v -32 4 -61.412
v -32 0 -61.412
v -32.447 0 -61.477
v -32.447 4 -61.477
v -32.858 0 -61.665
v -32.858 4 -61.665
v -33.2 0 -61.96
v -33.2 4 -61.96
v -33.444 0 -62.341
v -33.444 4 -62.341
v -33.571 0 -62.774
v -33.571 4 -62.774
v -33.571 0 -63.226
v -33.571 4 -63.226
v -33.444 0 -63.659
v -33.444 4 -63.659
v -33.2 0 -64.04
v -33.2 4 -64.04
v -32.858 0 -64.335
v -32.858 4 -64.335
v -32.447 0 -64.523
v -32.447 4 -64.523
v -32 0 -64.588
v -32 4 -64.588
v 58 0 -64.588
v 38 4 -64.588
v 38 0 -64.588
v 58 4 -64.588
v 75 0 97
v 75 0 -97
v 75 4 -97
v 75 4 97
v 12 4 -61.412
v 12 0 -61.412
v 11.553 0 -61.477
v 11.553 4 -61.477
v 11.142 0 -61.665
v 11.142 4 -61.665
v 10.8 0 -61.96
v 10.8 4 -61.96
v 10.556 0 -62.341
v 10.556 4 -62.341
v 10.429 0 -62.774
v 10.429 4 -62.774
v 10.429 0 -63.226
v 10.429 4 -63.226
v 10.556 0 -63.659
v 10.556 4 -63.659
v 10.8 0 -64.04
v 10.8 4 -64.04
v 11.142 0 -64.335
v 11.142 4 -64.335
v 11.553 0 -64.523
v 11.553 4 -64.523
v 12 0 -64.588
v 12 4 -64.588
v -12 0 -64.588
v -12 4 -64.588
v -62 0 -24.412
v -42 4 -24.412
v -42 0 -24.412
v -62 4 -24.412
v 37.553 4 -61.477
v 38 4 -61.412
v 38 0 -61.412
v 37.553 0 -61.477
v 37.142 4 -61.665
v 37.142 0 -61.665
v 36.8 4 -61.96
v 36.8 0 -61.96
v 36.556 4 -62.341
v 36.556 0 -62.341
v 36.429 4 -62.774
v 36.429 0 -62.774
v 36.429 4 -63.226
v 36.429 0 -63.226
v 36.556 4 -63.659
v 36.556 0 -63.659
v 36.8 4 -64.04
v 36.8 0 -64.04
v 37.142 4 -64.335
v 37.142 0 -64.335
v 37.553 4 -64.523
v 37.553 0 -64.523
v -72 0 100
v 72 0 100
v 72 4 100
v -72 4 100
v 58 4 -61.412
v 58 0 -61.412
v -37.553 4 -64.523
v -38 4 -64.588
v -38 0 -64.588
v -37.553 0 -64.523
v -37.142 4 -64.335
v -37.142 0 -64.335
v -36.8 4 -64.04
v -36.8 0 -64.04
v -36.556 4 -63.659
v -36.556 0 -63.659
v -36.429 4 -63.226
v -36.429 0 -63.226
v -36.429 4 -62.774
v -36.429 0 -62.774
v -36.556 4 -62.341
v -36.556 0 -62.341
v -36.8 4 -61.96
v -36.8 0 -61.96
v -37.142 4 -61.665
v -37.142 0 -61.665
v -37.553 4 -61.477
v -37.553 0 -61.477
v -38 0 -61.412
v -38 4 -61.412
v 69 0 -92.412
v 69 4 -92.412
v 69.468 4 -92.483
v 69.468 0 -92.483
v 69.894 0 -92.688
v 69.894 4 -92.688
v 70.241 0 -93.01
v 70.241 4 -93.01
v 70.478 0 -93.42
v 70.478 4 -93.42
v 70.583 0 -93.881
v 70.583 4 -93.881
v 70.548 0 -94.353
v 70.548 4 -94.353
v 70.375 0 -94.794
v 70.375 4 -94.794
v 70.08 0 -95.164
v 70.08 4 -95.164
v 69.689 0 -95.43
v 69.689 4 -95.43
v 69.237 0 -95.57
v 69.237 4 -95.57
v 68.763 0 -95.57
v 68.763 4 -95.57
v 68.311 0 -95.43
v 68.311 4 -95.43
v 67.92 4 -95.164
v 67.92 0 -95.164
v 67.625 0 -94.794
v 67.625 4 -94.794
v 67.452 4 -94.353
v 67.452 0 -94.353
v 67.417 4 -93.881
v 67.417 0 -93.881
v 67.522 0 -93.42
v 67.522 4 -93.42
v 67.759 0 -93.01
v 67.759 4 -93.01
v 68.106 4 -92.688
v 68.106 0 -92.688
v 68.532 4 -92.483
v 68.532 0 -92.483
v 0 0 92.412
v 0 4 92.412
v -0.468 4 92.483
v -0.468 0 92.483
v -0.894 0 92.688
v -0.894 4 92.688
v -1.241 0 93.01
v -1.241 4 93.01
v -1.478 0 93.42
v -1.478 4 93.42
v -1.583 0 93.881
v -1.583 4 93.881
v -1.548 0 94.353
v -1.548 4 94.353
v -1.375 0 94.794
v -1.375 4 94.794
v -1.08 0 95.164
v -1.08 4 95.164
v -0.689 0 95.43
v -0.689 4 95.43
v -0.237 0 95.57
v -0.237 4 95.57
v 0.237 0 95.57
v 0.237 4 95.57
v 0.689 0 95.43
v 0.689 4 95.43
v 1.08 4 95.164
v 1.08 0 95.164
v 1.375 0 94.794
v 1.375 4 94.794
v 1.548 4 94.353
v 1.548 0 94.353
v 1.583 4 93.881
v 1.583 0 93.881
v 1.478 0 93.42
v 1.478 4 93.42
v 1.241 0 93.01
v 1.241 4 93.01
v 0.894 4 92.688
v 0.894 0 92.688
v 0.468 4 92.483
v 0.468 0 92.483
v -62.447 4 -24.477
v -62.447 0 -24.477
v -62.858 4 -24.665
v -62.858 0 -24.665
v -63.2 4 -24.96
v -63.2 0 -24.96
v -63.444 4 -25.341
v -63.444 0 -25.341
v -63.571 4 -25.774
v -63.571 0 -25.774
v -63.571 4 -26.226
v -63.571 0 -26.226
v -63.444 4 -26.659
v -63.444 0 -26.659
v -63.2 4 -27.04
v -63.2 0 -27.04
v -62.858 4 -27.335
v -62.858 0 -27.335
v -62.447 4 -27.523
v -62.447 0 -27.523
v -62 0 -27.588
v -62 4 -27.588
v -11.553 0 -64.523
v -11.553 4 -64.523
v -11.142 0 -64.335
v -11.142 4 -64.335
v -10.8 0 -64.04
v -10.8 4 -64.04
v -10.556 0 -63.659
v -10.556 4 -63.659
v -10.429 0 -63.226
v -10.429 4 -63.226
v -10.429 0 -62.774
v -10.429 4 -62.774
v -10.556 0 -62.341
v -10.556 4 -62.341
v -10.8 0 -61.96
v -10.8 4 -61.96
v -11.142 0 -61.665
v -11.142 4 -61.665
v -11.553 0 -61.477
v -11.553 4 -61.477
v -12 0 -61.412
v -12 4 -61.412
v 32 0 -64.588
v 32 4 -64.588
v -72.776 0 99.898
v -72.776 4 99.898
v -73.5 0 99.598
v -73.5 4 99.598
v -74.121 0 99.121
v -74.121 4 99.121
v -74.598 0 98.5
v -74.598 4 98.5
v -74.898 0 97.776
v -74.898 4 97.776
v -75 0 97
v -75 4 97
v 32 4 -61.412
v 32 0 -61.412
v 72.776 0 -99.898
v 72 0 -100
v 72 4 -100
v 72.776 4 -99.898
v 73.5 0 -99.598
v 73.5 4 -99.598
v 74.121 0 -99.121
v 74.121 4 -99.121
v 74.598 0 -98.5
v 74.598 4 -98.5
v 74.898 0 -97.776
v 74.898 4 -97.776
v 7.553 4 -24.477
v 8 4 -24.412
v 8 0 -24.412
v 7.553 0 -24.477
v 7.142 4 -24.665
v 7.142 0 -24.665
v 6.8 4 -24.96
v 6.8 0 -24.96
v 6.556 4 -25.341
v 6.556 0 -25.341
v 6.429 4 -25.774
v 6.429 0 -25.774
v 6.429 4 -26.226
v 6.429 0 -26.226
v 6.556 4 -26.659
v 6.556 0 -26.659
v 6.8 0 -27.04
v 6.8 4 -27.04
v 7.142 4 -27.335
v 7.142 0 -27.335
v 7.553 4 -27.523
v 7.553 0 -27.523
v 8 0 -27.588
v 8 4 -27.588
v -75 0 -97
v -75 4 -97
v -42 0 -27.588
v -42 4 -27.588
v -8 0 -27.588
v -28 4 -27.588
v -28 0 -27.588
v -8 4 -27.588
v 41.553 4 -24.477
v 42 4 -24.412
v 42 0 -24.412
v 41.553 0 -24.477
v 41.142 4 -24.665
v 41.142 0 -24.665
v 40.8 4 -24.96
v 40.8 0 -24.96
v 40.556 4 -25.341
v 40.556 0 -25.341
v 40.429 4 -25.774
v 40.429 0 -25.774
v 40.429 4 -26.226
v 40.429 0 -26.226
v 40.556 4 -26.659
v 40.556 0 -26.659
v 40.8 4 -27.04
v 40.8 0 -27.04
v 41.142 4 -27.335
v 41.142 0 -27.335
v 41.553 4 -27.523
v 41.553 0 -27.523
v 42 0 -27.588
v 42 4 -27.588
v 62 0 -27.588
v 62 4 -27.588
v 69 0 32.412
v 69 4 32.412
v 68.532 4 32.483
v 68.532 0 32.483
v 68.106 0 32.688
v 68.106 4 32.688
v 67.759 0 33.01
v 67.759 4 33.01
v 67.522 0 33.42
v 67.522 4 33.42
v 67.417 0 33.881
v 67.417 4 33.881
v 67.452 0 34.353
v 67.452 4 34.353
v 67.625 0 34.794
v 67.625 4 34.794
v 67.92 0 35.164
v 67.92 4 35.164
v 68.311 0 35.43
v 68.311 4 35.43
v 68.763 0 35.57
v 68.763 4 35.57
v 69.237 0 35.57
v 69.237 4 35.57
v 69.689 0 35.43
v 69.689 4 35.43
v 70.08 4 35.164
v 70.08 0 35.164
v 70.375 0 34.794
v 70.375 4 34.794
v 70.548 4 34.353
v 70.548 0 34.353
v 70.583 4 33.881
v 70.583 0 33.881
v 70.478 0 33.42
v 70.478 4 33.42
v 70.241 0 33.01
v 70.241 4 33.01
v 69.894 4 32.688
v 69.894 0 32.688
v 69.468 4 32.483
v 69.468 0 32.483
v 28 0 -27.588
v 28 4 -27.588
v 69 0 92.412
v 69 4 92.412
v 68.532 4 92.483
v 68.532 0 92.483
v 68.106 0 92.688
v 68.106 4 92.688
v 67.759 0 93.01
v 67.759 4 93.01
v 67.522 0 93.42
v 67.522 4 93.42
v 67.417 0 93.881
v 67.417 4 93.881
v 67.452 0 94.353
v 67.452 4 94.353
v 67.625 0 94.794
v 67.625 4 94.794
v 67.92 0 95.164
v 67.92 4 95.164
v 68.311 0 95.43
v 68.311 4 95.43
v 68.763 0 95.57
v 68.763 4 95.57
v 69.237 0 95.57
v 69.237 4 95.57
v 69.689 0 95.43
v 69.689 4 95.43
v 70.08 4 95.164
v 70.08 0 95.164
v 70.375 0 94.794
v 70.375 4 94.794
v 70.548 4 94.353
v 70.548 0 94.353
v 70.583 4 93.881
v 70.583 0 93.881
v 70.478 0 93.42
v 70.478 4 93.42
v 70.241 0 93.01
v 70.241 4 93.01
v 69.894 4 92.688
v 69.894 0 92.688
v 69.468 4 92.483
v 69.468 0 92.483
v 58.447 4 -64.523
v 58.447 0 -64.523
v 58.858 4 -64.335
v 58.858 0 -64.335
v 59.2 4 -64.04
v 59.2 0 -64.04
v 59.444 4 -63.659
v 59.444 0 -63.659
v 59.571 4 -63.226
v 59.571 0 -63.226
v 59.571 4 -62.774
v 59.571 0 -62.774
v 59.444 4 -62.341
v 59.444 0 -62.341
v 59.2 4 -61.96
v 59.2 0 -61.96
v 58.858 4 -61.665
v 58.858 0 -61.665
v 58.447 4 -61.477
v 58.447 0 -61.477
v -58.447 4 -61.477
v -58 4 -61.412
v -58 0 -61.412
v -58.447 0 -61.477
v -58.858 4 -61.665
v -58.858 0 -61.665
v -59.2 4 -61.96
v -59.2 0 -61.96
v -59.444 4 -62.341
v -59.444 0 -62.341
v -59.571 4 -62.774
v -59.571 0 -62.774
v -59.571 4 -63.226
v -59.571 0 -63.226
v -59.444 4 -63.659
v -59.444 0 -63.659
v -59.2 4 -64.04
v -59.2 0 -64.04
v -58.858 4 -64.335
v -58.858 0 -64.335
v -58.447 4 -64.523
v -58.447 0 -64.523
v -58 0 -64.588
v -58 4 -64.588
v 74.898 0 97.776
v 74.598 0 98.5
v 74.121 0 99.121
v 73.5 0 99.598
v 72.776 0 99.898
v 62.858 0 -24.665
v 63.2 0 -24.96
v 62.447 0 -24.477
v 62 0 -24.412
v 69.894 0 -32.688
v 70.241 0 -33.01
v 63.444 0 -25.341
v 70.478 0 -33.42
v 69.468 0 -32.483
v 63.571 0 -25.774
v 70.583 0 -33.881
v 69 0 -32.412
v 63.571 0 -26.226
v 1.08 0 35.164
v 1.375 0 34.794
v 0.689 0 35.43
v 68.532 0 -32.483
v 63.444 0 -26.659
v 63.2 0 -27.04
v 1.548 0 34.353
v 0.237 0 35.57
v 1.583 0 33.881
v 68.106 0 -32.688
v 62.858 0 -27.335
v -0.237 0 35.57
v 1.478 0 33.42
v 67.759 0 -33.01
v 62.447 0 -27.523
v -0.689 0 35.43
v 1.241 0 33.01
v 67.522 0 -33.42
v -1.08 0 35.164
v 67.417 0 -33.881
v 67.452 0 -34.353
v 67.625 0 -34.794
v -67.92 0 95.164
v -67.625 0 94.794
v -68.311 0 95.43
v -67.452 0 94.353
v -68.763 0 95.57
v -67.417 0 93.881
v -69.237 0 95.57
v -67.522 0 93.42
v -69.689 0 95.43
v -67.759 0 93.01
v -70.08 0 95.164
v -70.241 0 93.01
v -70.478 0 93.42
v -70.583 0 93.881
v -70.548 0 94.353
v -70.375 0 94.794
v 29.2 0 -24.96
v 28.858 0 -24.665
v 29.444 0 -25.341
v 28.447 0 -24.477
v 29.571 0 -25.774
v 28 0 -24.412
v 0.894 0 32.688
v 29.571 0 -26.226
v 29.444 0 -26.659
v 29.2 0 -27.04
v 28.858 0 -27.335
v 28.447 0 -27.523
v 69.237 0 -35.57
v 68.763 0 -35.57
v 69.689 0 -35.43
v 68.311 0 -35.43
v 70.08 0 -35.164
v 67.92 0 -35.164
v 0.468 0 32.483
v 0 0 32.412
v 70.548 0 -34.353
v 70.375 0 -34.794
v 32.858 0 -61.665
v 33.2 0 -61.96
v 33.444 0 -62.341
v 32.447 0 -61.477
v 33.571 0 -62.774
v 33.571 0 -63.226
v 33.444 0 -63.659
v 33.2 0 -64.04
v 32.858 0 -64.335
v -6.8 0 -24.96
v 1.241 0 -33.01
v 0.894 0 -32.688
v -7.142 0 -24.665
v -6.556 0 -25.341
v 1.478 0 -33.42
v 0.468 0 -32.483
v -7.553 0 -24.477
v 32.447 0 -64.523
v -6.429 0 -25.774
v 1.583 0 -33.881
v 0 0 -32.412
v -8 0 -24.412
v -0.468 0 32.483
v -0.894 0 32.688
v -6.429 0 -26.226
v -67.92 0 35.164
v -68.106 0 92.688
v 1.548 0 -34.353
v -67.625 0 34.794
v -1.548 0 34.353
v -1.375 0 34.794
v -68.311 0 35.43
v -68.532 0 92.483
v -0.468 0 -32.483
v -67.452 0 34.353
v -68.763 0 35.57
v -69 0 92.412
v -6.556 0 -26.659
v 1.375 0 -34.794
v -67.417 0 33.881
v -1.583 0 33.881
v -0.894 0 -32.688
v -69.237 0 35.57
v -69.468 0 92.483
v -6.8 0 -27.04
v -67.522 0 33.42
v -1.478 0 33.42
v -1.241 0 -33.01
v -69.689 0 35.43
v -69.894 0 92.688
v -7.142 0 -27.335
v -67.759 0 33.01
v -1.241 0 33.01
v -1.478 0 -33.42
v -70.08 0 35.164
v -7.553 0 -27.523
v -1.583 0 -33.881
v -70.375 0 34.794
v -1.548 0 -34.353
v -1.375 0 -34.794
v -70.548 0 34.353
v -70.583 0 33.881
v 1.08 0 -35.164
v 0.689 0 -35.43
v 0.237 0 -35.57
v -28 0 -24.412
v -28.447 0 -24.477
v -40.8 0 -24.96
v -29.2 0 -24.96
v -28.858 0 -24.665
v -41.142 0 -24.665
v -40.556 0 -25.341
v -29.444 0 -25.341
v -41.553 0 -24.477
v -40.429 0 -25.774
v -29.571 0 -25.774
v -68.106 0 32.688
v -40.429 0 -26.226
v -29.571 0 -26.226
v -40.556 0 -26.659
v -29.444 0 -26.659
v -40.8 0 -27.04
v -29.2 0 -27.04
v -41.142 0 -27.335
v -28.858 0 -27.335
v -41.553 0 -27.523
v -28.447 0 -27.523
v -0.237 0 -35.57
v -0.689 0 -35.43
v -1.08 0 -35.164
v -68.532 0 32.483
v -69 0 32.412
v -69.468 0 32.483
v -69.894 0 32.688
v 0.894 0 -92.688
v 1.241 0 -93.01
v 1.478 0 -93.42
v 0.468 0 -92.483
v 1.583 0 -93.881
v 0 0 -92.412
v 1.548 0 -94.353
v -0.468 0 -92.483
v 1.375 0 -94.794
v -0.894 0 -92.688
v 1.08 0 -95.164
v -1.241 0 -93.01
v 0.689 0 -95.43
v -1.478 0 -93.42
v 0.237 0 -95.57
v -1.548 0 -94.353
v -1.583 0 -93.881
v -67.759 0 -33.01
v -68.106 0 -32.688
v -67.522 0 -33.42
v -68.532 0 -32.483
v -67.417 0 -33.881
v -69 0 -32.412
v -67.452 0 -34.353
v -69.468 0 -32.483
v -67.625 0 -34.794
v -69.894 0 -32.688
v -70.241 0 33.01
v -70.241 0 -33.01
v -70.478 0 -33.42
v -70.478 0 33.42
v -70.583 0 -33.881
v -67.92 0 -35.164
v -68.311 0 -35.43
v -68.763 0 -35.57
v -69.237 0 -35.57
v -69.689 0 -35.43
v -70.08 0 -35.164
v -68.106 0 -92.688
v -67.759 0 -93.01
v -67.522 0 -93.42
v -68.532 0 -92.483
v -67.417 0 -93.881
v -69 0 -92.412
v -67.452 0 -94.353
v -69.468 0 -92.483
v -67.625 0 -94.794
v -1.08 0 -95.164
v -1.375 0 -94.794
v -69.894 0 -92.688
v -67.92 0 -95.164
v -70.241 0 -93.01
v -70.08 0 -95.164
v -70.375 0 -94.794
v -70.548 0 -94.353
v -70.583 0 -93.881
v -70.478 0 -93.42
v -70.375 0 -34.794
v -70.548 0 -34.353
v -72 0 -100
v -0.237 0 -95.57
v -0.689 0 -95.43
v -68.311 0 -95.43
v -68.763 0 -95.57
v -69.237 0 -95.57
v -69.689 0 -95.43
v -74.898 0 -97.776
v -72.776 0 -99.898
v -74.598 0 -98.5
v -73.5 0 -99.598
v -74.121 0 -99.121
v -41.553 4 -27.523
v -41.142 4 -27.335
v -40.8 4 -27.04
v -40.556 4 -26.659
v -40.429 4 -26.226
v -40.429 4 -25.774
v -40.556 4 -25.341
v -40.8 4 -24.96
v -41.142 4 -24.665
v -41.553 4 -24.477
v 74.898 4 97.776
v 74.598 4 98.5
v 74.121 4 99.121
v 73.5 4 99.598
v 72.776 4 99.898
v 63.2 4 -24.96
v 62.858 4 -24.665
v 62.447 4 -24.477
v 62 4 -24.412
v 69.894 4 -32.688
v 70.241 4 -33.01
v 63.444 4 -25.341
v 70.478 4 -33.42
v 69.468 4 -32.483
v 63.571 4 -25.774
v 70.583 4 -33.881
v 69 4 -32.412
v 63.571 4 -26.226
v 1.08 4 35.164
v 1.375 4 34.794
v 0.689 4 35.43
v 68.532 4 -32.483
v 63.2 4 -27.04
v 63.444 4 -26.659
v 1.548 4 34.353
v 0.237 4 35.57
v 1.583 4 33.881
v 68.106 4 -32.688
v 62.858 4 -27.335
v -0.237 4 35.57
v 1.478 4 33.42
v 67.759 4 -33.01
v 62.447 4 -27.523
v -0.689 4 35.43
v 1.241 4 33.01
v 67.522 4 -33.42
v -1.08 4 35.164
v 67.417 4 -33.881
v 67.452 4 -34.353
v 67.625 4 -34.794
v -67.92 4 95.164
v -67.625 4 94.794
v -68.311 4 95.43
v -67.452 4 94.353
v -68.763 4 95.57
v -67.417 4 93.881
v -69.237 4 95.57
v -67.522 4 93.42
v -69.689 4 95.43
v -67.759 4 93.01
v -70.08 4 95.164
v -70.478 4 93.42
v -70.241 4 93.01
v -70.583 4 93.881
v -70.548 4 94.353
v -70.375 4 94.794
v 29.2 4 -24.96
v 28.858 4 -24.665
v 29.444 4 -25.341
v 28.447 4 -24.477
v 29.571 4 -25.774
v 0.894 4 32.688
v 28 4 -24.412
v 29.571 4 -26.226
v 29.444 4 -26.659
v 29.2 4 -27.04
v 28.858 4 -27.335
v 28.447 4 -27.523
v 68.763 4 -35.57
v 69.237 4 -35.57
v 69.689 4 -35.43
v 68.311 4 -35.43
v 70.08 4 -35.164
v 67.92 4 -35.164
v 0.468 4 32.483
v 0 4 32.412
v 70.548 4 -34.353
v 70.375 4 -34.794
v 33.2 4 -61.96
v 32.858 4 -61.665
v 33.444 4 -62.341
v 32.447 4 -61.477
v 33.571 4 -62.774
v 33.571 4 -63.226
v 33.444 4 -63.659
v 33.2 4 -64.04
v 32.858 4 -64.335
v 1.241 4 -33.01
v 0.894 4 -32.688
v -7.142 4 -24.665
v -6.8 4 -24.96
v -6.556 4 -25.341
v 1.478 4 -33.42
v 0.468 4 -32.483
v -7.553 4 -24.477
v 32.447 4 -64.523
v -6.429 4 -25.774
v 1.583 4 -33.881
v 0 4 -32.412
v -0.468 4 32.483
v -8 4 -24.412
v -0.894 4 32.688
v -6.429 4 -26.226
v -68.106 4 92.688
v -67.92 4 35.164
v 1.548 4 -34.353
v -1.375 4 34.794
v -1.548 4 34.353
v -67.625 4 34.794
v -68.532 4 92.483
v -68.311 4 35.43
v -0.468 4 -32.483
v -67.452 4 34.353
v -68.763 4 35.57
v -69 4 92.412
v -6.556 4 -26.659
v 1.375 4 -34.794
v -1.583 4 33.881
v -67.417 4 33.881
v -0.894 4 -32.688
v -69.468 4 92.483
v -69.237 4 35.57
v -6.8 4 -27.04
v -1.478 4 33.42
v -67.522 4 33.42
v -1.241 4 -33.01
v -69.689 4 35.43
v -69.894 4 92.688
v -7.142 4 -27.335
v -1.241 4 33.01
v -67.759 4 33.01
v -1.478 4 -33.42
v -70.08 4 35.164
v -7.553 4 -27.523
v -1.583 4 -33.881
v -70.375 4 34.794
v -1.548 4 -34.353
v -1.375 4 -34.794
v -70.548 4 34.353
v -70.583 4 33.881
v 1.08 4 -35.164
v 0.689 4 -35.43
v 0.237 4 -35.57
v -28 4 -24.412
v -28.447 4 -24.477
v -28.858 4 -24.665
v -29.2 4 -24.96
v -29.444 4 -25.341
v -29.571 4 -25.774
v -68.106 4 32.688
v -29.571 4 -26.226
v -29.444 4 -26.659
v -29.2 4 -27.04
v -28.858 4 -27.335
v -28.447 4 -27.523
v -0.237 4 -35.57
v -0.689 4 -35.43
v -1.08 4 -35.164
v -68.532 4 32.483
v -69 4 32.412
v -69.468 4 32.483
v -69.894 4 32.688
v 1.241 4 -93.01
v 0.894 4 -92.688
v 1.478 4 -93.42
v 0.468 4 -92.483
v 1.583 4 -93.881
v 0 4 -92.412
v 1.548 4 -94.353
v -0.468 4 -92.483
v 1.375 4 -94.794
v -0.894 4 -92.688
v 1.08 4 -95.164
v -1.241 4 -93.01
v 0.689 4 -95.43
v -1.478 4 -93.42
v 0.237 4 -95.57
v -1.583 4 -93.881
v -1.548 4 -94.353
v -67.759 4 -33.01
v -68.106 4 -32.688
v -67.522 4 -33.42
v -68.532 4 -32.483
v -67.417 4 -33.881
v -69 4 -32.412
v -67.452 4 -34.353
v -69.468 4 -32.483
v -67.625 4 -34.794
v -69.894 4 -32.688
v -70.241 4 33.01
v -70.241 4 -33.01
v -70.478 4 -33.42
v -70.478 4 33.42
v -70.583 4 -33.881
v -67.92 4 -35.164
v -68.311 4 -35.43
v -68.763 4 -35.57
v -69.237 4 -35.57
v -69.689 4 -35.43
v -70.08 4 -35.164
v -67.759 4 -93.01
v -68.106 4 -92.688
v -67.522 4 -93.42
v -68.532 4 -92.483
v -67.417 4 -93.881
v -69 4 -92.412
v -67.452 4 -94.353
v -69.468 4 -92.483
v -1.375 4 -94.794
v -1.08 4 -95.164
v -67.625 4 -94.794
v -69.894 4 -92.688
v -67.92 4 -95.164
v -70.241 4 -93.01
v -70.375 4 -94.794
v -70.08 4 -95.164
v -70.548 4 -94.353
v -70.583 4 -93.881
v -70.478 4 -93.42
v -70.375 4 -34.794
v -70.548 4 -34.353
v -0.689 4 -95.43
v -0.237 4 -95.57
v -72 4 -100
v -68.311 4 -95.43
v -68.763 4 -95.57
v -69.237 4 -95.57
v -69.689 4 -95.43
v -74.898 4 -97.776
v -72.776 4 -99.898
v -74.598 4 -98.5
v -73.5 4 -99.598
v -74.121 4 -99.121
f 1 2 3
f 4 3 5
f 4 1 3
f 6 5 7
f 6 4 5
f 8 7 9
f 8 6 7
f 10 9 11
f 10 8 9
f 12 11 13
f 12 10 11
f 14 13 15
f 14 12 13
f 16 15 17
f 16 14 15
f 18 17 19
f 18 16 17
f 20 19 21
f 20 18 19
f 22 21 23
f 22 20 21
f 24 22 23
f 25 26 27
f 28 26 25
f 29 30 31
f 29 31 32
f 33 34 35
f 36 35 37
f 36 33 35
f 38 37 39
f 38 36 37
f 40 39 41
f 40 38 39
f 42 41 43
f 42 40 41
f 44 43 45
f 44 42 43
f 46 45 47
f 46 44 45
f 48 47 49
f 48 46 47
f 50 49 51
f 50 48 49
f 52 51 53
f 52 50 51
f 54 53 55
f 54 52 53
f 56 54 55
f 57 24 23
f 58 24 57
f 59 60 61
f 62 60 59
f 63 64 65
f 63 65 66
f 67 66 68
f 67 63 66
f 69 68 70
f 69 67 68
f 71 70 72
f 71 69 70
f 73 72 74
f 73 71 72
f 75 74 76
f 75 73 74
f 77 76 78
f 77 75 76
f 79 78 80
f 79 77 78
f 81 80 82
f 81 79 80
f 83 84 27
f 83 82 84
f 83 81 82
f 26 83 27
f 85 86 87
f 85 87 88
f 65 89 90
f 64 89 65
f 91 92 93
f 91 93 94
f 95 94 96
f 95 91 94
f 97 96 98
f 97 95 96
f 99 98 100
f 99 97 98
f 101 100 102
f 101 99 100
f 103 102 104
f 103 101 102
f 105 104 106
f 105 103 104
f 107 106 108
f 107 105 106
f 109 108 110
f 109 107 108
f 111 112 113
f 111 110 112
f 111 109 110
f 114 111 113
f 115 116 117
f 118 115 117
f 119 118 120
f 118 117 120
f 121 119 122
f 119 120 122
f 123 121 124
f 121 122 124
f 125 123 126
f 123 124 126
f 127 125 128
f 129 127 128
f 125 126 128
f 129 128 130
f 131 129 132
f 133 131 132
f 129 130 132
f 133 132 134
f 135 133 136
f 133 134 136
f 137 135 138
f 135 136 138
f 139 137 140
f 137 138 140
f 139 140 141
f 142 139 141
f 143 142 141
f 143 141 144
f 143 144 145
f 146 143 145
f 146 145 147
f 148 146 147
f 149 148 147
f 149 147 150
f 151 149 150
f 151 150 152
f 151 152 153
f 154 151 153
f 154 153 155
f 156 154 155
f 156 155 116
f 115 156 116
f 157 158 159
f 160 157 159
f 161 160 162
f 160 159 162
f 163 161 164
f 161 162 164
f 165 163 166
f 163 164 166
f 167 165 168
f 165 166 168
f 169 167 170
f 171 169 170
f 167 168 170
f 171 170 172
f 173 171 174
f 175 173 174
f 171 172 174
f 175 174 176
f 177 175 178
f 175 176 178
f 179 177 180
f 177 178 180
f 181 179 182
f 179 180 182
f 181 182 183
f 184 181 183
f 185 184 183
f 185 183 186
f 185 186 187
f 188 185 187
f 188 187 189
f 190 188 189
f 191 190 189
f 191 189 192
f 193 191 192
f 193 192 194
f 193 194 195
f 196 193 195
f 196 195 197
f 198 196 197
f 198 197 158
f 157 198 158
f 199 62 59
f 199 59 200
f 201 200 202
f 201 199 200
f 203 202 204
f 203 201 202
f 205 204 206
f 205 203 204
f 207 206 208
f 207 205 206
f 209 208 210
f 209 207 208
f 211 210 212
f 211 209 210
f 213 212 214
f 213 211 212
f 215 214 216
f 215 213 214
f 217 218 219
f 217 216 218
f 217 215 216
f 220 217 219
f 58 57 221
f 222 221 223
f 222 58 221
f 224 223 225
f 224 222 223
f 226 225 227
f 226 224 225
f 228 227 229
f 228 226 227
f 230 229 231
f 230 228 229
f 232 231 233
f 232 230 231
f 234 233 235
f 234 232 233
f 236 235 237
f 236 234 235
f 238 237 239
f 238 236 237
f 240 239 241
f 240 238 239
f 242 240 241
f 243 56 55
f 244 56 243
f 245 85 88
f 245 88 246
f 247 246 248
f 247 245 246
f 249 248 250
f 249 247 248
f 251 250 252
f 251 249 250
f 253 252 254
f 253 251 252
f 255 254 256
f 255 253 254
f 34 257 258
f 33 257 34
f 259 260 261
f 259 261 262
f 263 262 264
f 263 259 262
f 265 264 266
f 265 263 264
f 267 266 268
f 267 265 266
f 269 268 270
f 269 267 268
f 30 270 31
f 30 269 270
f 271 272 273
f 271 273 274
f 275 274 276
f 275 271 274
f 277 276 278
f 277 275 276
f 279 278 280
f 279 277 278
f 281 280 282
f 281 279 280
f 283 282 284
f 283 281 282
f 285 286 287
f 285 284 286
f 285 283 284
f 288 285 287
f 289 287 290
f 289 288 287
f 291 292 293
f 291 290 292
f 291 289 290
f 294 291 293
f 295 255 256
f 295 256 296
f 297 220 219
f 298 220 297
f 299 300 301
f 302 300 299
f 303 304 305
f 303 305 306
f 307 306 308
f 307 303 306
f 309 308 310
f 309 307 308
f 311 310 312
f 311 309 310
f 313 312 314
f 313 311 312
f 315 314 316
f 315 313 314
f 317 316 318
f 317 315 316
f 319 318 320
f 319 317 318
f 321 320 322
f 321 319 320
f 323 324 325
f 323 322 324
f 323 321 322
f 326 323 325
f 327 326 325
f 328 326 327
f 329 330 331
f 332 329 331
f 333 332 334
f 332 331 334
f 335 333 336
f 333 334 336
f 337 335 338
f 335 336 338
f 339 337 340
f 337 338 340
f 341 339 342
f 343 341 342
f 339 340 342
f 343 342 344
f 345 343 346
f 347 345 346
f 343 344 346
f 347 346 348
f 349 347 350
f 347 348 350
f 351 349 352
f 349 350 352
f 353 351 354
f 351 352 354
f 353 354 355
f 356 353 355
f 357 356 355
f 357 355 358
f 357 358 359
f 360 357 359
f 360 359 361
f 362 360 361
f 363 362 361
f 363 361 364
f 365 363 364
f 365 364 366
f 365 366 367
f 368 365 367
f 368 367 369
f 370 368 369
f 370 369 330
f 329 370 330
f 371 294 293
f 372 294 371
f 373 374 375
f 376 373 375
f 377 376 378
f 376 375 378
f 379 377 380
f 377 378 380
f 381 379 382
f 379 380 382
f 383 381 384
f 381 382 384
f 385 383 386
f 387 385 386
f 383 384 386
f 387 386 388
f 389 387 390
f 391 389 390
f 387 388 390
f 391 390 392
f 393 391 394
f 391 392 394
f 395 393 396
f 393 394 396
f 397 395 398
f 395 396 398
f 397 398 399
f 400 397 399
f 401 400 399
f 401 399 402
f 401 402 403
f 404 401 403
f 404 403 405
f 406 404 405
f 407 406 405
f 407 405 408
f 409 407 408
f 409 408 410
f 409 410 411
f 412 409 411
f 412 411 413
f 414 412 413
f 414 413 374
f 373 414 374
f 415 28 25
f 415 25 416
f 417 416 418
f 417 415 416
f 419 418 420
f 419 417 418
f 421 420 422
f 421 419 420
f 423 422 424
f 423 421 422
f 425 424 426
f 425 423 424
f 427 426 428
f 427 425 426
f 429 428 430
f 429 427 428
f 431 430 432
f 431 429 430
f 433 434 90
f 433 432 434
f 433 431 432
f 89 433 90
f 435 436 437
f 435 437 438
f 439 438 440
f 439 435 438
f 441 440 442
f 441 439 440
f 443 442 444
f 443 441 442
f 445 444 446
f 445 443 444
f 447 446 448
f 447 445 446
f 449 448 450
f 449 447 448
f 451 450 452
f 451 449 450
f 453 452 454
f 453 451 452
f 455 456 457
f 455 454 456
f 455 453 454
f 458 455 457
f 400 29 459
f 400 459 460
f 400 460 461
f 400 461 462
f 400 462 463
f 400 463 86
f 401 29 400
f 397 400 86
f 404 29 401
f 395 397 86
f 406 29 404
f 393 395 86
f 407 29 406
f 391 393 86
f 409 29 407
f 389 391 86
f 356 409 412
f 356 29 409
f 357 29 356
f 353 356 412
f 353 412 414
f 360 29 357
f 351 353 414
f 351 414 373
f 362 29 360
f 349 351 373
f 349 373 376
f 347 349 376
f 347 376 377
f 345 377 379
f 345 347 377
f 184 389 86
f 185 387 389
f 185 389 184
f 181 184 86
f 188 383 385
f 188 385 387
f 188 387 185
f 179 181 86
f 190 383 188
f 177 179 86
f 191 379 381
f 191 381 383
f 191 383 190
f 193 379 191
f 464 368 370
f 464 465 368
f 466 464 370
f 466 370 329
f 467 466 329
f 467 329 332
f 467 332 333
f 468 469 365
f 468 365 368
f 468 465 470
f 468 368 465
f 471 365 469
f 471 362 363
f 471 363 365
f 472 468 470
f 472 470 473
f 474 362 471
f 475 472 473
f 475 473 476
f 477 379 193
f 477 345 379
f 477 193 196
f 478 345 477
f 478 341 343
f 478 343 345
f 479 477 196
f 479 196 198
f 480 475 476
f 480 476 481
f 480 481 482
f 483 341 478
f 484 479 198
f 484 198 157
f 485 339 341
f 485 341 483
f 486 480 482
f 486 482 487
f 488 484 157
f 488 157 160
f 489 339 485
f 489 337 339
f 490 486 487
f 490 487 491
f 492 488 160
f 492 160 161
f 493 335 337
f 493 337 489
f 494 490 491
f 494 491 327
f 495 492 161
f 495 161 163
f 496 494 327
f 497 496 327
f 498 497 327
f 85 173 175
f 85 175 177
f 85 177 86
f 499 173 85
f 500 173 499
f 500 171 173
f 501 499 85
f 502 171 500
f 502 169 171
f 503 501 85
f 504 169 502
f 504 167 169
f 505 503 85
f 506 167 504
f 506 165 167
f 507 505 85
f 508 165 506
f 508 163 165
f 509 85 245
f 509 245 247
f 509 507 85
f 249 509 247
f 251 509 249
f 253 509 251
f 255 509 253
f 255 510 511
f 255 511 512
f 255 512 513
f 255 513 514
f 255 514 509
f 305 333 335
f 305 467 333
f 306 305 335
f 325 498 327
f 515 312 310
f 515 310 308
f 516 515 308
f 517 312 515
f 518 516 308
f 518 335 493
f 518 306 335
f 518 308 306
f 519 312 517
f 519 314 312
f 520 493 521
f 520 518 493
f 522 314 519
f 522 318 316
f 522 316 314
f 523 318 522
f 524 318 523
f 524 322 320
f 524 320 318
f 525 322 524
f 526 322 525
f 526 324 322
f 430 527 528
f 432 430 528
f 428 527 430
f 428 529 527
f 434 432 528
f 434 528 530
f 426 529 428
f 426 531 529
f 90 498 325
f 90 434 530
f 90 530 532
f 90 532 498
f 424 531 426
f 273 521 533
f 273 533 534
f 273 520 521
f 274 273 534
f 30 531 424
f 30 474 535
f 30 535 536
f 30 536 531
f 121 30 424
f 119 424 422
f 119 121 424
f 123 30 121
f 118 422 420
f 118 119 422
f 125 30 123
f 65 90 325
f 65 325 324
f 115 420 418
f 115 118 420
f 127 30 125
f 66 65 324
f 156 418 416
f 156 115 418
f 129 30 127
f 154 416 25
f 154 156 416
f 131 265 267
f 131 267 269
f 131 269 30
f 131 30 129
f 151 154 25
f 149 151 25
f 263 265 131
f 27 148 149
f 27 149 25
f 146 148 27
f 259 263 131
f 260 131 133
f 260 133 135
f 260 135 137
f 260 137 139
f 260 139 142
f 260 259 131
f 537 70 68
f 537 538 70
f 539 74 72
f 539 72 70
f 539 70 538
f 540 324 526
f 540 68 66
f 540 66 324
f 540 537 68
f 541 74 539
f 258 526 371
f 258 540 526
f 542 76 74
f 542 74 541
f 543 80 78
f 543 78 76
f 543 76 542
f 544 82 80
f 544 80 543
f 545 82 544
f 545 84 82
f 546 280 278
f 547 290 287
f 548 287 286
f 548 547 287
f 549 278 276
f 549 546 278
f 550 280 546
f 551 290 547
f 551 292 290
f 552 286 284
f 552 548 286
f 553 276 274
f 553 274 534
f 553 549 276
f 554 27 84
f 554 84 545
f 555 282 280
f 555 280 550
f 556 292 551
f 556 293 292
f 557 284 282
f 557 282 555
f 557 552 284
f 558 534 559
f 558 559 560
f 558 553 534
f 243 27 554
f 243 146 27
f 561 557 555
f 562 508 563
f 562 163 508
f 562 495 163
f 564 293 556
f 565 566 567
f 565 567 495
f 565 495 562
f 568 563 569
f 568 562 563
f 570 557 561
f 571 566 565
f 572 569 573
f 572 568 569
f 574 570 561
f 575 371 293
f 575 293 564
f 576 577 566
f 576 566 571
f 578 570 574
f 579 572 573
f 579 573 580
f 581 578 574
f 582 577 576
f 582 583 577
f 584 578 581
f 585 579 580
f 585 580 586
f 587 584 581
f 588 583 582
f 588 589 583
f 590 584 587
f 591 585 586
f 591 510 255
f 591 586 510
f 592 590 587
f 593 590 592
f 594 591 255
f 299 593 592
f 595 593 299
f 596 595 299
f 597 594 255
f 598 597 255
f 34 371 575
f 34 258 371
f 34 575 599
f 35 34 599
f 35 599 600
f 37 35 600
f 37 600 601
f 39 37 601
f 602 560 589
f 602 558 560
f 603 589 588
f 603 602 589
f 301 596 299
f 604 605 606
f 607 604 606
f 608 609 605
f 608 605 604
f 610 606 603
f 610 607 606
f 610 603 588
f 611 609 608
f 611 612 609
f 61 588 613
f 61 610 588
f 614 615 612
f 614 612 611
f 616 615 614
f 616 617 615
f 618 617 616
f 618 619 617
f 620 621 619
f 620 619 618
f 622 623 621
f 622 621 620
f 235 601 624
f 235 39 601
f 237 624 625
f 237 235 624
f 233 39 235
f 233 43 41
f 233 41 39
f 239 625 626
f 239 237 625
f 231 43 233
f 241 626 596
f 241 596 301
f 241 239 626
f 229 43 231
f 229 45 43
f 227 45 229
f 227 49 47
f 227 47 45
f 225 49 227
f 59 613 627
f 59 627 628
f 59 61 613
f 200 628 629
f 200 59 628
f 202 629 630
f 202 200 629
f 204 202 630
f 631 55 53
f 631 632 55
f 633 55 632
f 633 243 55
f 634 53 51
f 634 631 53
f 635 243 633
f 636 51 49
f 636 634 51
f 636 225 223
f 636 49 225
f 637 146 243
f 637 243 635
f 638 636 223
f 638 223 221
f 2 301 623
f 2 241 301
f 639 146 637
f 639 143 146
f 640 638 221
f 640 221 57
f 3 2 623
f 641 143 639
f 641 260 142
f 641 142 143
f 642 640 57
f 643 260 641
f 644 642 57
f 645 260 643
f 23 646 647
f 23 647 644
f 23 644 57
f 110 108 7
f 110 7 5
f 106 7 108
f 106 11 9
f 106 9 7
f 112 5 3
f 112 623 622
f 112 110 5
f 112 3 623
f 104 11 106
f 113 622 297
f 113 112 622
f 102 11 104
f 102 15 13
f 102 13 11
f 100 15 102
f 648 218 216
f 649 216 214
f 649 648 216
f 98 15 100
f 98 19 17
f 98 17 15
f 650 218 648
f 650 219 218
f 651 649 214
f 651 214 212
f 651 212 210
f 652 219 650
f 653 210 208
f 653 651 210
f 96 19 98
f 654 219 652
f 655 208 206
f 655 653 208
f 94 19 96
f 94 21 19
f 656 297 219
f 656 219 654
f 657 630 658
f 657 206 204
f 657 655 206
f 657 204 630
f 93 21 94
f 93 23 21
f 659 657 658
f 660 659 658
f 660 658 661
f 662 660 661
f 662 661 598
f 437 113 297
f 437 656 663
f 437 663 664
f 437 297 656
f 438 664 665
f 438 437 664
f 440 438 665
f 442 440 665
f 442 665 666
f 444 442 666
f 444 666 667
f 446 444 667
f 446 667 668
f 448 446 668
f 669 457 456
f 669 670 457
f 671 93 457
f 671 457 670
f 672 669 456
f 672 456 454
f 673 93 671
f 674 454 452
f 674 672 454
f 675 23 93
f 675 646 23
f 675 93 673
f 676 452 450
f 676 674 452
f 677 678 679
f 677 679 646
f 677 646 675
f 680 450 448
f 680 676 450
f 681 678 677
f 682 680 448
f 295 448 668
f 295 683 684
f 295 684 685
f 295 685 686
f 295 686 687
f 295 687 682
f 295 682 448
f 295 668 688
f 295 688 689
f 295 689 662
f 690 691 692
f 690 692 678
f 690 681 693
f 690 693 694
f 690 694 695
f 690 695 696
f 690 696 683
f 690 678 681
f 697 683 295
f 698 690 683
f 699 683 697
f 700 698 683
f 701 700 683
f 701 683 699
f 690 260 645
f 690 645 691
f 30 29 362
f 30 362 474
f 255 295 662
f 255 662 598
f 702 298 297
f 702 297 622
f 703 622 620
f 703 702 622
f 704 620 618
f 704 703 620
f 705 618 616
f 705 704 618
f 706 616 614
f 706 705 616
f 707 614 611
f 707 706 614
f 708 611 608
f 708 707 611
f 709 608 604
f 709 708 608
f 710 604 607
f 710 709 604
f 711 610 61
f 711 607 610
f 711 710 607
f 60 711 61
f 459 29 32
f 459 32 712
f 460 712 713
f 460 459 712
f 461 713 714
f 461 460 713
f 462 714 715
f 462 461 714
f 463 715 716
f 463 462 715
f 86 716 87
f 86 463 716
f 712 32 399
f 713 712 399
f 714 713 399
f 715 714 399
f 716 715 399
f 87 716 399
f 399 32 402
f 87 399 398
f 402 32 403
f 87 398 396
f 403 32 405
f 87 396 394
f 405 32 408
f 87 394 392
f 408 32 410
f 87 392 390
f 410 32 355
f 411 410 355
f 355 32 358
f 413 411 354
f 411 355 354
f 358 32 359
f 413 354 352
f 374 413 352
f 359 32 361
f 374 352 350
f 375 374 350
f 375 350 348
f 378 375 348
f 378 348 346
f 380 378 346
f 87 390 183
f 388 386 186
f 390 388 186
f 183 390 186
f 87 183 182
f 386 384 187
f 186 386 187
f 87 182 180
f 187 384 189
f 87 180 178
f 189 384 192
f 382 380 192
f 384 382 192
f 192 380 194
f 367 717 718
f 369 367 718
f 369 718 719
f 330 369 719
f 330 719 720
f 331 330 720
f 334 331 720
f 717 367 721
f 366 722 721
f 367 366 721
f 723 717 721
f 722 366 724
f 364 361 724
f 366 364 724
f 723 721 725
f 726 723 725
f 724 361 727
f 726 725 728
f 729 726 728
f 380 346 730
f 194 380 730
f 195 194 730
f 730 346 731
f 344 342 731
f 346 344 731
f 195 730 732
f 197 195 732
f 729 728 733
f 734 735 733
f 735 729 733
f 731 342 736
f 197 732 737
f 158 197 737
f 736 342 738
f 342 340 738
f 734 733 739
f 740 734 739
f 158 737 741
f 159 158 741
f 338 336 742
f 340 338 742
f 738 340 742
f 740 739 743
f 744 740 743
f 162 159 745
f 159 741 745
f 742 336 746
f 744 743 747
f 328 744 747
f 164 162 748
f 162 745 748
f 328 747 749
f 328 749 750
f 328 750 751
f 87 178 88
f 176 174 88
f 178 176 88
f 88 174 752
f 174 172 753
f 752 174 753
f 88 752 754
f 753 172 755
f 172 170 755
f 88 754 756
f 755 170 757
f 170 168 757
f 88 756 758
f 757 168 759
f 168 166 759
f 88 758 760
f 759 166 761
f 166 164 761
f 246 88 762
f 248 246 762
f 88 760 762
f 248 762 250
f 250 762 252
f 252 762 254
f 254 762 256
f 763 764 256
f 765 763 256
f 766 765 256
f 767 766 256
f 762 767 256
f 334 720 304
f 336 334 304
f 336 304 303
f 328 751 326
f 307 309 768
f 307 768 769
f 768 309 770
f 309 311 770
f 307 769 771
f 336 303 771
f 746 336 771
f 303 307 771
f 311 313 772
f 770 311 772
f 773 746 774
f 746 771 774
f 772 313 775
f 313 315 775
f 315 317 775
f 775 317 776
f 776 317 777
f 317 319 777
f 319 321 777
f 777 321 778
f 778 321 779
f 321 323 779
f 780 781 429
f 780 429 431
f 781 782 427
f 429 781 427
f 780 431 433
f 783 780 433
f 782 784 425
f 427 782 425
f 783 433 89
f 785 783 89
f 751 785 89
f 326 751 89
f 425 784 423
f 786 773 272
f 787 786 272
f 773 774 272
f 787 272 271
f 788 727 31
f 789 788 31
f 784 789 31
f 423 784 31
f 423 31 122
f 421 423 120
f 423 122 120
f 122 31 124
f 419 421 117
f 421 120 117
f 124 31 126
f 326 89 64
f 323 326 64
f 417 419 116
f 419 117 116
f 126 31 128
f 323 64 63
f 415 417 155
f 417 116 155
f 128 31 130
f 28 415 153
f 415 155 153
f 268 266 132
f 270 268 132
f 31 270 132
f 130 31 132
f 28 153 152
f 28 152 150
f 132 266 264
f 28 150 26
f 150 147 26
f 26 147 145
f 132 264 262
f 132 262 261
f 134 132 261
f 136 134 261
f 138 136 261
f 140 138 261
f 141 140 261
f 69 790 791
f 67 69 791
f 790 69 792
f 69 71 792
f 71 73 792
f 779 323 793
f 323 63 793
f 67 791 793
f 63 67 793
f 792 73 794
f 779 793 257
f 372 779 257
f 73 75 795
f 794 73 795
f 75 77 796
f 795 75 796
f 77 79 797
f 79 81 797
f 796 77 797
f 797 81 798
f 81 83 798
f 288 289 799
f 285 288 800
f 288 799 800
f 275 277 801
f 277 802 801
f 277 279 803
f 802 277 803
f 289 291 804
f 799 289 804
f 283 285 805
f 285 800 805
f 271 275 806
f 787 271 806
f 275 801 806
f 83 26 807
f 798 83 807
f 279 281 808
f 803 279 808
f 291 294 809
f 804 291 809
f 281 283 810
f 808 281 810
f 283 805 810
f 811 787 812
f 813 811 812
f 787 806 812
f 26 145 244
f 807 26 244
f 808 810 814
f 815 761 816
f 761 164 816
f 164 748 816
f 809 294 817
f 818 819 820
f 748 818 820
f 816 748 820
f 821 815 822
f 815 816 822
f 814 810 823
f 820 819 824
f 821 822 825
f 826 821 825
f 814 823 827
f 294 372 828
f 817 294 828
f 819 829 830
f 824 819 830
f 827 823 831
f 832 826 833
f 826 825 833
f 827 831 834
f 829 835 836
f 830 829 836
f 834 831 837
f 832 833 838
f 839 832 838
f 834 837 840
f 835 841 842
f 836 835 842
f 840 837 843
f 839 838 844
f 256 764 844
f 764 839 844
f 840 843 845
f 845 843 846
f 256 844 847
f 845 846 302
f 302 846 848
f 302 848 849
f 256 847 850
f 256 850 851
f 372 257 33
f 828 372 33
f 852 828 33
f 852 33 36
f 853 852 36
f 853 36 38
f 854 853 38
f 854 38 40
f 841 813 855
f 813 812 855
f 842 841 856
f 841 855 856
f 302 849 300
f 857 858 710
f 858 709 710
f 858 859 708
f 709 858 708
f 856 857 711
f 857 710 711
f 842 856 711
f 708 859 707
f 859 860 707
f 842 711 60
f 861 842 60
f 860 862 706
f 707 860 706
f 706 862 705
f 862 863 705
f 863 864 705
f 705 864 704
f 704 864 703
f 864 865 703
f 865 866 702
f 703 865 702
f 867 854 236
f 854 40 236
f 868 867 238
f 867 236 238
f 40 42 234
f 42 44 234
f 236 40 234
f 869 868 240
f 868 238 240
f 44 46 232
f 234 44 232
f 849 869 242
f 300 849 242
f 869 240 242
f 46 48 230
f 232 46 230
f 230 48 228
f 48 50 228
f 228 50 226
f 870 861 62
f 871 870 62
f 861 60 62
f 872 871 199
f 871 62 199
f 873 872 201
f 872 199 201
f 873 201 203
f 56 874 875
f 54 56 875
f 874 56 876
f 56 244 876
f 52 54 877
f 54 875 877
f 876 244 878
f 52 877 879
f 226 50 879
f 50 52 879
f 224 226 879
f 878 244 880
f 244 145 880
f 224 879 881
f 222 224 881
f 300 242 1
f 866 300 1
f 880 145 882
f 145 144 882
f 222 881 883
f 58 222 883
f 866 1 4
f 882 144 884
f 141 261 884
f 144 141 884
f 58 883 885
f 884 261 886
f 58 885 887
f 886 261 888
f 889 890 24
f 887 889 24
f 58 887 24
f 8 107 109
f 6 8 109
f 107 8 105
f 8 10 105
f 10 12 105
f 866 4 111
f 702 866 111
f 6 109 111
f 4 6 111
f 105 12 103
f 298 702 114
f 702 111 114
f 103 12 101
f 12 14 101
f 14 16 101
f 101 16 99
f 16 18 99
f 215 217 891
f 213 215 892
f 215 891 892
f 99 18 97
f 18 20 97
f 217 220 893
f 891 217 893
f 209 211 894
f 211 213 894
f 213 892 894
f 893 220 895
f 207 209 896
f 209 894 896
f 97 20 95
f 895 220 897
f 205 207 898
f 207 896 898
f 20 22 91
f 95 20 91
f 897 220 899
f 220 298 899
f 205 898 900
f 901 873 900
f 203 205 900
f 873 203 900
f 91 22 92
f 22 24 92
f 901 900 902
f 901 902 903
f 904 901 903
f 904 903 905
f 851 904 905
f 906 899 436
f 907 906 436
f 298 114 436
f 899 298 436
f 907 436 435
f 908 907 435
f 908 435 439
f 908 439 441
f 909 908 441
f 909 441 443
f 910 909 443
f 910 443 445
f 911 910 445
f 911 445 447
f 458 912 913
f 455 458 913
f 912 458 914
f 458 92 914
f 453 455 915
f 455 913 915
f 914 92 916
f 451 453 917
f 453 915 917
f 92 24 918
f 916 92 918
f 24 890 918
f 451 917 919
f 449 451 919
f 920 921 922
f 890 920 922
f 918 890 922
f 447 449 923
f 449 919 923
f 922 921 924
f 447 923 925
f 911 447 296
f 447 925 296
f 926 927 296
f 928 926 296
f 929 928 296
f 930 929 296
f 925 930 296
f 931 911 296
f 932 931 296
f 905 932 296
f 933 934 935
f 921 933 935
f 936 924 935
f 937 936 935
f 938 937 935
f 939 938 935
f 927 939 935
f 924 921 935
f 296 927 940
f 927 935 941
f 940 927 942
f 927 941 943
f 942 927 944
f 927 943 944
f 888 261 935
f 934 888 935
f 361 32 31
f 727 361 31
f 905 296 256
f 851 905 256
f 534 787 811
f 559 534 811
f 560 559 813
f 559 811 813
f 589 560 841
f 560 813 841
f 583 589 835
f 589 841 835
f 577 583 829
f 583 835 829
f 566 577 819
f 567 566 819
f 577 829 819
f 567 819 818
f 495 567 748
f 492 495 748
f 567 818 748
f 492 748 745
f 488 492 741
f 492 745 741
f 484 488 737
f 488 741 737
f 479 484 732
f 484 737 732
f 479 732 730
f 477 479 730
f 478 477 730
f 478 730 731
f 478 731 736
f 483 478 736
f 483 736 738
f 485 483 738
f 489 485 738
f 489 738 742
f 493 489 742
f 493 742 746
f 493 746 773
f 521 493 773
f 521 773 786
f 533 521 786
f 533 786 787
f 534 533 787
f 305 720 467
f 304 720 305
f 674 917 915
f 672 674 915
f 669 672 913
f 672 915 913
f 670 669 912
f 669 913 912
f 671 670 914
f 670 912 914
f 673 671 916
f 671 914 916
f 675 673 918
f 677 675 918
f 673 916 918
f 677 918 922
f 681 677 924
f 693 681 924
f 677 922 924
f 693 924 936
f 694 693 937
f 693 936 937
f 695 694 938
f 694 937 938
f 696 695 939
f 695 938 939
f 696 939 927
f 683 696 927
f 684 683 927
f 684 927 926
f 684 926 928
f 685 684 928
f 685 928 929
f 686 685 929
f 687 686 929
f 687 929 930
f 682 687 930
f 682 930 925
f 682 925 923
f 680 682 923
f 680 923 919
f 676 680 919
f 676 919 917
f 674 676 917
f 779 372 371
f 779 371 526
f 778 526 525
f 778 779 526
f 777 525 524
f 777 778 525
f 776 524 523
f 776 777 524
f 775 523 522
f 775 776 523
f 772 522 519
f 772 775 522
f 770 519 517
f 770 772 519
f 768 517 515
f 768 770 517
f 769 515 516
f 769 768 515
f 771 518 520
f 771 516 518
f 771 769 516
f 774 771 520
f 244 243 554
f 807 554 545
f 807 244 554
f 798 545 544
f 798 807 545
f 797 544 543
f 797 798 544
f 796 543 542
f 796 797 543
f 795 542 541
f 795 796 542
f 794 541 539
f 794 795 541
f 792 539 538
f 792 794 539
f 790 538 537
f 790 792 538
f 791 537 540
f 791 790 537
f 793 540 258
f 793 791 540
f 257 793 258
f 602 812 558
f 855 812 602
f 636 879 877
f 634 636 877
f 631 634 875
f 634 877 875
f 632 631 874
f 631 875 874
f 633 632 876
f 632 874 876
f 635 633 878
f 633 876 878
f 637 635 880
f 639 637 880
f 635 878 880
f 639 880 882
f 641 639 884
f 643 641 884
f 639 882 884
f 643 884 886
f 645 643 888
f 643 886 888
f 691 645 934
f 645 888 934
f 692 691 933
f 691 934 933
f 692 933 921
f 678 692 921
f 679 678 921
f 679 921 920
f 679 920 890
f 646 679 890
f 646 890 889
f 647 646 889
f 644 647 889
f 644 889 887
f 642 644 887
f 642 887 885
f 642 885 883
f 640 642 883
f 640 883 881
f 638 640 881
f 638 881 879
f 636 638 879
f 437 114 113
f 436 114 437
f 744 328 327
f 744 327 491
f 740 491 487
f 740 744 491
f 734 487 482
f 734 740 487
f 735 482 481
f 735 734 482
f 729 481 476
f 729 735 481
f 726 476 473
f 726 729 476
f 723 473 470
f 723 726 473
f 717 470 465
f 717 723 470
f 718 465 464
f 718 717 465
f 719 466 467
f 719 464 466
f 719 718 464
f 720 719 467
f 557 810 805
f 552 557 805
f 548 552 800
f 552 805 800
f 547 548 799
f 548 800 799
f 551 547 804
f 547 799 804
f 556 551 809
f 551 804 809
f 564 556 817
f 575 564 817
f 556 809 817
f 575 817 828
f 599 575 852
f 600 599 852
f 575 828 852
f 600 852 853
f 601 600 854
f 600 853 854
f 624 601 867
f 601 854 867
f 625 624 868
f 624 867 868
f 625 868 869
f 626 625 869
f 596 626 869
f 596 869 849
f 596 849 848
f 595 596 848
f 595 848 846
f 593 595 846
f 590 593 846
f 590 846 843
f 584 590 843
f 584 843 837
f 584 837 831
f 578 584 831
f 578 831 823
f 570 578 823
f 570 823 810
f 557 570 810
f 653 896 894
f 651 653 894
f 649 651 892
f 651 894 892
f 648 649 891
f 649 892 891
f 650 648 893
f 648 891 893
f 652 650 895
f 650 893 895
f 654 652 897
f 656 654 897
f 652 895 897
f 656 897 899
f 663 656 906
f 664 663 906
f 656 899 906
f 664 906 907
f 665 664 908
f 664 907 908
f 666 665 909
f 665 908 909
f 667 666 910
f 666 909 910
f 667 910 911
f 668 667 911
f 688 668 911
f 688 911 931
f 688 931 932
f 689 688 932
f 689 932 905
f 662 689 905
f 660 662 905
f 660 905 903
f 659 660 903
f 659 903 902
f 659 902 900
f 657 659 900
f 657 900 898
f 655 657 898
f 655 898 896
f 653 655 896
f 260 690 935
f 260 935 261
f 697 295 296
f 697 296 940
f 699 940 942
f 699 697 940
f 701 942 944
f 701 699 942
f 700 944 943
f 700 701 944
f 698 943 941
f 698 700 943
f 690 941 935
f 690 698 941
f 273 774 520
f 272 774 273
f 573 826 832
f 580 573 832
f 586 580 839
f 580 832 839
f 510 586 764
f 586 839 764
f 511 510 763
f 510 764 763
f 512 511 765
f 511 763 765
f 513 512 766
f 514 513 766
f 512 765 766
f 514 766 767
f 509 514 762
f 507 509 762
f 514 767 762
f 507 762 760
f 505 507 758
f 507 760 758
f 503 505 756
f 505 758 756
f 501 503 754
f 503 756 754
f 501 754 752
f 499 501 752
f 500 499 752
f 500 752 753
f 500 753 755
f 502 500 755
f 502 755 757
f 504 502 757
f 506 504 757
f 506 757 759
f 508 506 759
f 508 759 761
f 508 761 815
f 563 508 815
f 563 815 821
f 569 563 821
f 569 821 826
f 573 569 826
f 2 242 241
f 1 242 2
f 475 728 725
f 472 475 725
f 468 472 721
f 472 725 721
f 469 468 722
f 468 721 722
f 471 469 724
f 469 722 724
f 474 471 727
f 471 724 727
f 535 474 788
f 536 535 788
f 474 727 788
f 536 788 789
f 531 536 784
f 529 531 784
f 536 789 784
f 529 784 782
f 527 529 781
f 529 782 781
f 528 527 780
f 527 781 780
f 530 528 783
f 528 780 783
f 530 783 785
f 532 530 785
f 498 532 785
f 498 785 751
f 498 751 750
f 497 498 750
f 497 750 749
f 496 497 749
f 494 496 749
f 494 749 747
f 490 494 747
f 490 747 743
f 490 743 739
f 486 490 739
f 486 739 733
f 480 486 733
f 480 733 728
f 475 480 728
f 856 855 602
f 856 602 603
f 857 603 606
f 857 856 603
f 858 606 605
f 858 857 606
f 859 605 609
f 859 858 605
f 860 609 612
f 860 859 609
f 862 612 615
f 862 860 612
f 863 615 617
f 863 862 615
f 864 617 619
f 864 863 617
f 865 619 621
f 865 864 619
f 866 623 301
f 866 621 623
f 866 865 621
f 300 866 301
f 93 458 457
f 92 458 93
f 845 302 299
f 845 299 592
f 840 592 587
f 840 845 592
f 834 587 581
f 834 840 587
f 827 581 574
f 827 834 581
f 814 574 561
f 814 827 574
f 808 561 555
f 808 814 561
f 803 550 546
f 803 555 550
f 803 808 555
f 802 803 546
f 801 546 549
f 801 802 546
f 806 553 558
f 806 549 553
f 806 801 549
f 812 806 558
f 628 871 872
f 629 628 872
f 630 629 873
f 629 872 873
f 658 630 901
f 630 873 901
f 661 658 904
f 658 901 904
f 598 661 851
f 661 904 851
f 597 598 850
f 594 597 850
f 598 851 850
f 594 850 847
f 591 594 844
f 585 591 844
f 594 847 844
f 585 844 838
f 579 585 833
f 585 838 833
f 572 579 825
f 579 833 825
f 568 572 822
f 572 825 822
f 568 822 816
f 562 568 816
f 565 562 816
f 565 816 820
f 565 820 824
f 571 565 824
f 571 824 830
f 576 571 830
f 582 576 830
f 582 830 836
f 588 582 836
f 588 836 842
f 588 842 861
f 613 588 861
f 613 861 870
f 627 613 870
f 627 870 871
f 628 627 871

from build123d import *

# Parameters (mm, degrees)
EXTRUDE_1_DEPTH     = 4
SKETCH_3_R          = 1.5875
CUT_EXTRUDE_2_DEPTH = 126.063983624
CUT_EXTRUDE_3_DEPTH = 126.063983624


with BuildPart() as part:
    # Эскиз1 → Бобышка-Вытянуть1 (new body)
    with BuildSketch(Plane(origin=(0, 0, 0), x_dir=(1, 0, 0), z_dir=(0, 1, 0))):
        with BuildLine():
            Line((-72, 100), (72, 100))
            ThreePointArc((72, 100), (74.121320344, 99.121320344), (75, 97))
            Line((75, 97), (75, -97))
            ThreePointArc((75, -97), (74.121320344, -99.121320344), (72, -100))
            Line((72, -100), (-72, -100))
            ThreePointArc((-72, -100), (-74.121320344, -99.121320344), (-75, -97))
            Line((-75, -97), (-75, 97))
            ThreePointArc((-75, 97), (-74.121320344, 99.121320344), (-72, 100))
        make_face()
    extrude(amount=EXTRUDE_1_DEPTH)

    # Эскиз3 → Вырез-Вытянуть2 (cut, through all)
    with BuildSketch(Plane(origin=(0, 4, 0), x_dir=(1, 0, 0), z_dir=(0, 1, 0))):
        with Locations(Location((-69, 94, 0), (0, 0, 270))):
            Circle(SKETCH_3_R)
        with Locations(Location((0, 94, 0), (0, 0, 270))):
            Circle(SKETCH_3_R)
        with Locations(Location((69, 94, 0), (0, 0, 270))):
            Circle(SKETCH_3_R)
        with Locations(Location((-69, -34, 0), (0, 0, 90))):
            Circle(SKETCH_3_R)
        with Locations(Location((69, -34, 0), (0, 0, 90))):
            Circle(SKETCH_3_R)
        with Locations(Location((0, -34, 0), (0, 0, 90))):
            Circle(SKETCH_3_R)
        with Locations(Location((69, -94, 0), (0, 0, 90))):
            Circle(SKETCH_3_R)
        with Locations(Location((0, -94, 0), (0, 0, 90))):
            Circle(SKETCH_3_R)
        with Locations(Location((-69, -94, 0), (0, 0, 90))):
            Circle(SKETCH_3_R)
        with Locations(Location((0, 34, 0), (0, 0, 270))):
            Circle(SKETCH_3_R)
        with Locations(Location((69, 34, 0), (0, 0, 270))):
            Circle(SKETCH_3_R)
        with Locations(Location((-69, 34, 0), (0, 0, 270))):
            Circle(SKETCH_3_R)
    extrude(amount=-CUT_EXTRUDE_2_DEPTH, mode=Mode.SUBTRACT)

    # Эскиз2 → Вырез-Вытянуть3 (cut, through all)
    with BuildSketch(Plane(origin=(0, 4, 0), x_dir=(1, 0, 0), z_dir=(0, 1, 0))):
        with BuildLine():
            Line((-32, 64.5875), (-12, 64.5875))
            ThreePointArc((-12, 64.5875), (-10.4125, 63), (-12, 61.4125))
            Line((-12, 61.4125), (-32, 61.4125))
            ThreePointArc((-32, 61.4125), (-33.5875, 63), (-32, 64.5875))
        make_face()
        with BuildLine():
            Line((-58, 64.5875), (-38, 64.5875))
            ThreePointArc((-38, 64.5875), (-36.4125, 63), (-38, 61.4125))
            Line((-38, 61.4125), (-58, 61.4125))
            ThreePointArc((-58, 61.4125), (-59.5875, 63), (-58, 64.5875))
        make_face()
        with BuildLine():
            Line((-28, 27.5875), (-8, 27.5875))
            ThreePointArc((-8, 27.5875), (-6.4125, 26), (-8, 24.4125))
            Line((-8, 24.4125), (-28, 24.4125))
            ThreePointArc((-28, 24.4125), (-29.5875, 26), (-28, 27.5875))
        make_face()
        with BuildLine():
            Line((-62, 27.5875), (-42, 27.5875))
            ThreePointArc((-42, 27.5875), (-40.4125, 26), (-42, 24.4125))
            Line((-42, 24.4125), (-62, 24.4125))
            ThreePointArc((-62, 24.4125), (-63.5875, 26), (-62, 27.5875))
        make_face()
        with BuildLine():
            Line((62, 24.4125), (42, 24.4125))
            ThreePointArc((42, 24.4125), (40.4125, 26), (42, 27.5875))
            Line((42, 27.5875), (62, 27.5875))
            ThreePointArc((62, 27.5875), (63.5875, 26), (62, 24.4125))
        make_face()
        with BuildLine():
            Line((28, 24.4125), (8, 24.4125))
            ThreePointArc((8, 24.4125), (6.4125, 26), (8, 27.5875))
            Line((8, 27.5875), (28, 27.5875))
            ThreePointArc((28, 27.5875), (29.5875, 26), (28, 24.4125))
        make_face()
        with BuildLine():
            Line((58, 61.4125), (38, 61.4125))
            ThreePointArc((38, 61.4125), (36.4125, 63), (38, 64.5875))
            Line((38, 64.5875), (58, 64.5875))
            ThreePointArc((58, 64.5875), (59.5875, 63), (58, 61.4125))
        make_face()
        with BuildLine():
            Line((32, 61.4125), (12, 61.4125))
            ThreePointArc((12, 61.4125), (10.4125, 63), (12, 64.5875))
            Line((12, 64.5875), (32, 64.5875))
            ThreePointArc((32, 64.5875), (33.5875, 63), (32, 61.4125))
        make_face()
    extrude(amount=-CUT_EXTRUDE_3_DEPTH, mode=Mode.SUBTRACT)


solid = part.part
